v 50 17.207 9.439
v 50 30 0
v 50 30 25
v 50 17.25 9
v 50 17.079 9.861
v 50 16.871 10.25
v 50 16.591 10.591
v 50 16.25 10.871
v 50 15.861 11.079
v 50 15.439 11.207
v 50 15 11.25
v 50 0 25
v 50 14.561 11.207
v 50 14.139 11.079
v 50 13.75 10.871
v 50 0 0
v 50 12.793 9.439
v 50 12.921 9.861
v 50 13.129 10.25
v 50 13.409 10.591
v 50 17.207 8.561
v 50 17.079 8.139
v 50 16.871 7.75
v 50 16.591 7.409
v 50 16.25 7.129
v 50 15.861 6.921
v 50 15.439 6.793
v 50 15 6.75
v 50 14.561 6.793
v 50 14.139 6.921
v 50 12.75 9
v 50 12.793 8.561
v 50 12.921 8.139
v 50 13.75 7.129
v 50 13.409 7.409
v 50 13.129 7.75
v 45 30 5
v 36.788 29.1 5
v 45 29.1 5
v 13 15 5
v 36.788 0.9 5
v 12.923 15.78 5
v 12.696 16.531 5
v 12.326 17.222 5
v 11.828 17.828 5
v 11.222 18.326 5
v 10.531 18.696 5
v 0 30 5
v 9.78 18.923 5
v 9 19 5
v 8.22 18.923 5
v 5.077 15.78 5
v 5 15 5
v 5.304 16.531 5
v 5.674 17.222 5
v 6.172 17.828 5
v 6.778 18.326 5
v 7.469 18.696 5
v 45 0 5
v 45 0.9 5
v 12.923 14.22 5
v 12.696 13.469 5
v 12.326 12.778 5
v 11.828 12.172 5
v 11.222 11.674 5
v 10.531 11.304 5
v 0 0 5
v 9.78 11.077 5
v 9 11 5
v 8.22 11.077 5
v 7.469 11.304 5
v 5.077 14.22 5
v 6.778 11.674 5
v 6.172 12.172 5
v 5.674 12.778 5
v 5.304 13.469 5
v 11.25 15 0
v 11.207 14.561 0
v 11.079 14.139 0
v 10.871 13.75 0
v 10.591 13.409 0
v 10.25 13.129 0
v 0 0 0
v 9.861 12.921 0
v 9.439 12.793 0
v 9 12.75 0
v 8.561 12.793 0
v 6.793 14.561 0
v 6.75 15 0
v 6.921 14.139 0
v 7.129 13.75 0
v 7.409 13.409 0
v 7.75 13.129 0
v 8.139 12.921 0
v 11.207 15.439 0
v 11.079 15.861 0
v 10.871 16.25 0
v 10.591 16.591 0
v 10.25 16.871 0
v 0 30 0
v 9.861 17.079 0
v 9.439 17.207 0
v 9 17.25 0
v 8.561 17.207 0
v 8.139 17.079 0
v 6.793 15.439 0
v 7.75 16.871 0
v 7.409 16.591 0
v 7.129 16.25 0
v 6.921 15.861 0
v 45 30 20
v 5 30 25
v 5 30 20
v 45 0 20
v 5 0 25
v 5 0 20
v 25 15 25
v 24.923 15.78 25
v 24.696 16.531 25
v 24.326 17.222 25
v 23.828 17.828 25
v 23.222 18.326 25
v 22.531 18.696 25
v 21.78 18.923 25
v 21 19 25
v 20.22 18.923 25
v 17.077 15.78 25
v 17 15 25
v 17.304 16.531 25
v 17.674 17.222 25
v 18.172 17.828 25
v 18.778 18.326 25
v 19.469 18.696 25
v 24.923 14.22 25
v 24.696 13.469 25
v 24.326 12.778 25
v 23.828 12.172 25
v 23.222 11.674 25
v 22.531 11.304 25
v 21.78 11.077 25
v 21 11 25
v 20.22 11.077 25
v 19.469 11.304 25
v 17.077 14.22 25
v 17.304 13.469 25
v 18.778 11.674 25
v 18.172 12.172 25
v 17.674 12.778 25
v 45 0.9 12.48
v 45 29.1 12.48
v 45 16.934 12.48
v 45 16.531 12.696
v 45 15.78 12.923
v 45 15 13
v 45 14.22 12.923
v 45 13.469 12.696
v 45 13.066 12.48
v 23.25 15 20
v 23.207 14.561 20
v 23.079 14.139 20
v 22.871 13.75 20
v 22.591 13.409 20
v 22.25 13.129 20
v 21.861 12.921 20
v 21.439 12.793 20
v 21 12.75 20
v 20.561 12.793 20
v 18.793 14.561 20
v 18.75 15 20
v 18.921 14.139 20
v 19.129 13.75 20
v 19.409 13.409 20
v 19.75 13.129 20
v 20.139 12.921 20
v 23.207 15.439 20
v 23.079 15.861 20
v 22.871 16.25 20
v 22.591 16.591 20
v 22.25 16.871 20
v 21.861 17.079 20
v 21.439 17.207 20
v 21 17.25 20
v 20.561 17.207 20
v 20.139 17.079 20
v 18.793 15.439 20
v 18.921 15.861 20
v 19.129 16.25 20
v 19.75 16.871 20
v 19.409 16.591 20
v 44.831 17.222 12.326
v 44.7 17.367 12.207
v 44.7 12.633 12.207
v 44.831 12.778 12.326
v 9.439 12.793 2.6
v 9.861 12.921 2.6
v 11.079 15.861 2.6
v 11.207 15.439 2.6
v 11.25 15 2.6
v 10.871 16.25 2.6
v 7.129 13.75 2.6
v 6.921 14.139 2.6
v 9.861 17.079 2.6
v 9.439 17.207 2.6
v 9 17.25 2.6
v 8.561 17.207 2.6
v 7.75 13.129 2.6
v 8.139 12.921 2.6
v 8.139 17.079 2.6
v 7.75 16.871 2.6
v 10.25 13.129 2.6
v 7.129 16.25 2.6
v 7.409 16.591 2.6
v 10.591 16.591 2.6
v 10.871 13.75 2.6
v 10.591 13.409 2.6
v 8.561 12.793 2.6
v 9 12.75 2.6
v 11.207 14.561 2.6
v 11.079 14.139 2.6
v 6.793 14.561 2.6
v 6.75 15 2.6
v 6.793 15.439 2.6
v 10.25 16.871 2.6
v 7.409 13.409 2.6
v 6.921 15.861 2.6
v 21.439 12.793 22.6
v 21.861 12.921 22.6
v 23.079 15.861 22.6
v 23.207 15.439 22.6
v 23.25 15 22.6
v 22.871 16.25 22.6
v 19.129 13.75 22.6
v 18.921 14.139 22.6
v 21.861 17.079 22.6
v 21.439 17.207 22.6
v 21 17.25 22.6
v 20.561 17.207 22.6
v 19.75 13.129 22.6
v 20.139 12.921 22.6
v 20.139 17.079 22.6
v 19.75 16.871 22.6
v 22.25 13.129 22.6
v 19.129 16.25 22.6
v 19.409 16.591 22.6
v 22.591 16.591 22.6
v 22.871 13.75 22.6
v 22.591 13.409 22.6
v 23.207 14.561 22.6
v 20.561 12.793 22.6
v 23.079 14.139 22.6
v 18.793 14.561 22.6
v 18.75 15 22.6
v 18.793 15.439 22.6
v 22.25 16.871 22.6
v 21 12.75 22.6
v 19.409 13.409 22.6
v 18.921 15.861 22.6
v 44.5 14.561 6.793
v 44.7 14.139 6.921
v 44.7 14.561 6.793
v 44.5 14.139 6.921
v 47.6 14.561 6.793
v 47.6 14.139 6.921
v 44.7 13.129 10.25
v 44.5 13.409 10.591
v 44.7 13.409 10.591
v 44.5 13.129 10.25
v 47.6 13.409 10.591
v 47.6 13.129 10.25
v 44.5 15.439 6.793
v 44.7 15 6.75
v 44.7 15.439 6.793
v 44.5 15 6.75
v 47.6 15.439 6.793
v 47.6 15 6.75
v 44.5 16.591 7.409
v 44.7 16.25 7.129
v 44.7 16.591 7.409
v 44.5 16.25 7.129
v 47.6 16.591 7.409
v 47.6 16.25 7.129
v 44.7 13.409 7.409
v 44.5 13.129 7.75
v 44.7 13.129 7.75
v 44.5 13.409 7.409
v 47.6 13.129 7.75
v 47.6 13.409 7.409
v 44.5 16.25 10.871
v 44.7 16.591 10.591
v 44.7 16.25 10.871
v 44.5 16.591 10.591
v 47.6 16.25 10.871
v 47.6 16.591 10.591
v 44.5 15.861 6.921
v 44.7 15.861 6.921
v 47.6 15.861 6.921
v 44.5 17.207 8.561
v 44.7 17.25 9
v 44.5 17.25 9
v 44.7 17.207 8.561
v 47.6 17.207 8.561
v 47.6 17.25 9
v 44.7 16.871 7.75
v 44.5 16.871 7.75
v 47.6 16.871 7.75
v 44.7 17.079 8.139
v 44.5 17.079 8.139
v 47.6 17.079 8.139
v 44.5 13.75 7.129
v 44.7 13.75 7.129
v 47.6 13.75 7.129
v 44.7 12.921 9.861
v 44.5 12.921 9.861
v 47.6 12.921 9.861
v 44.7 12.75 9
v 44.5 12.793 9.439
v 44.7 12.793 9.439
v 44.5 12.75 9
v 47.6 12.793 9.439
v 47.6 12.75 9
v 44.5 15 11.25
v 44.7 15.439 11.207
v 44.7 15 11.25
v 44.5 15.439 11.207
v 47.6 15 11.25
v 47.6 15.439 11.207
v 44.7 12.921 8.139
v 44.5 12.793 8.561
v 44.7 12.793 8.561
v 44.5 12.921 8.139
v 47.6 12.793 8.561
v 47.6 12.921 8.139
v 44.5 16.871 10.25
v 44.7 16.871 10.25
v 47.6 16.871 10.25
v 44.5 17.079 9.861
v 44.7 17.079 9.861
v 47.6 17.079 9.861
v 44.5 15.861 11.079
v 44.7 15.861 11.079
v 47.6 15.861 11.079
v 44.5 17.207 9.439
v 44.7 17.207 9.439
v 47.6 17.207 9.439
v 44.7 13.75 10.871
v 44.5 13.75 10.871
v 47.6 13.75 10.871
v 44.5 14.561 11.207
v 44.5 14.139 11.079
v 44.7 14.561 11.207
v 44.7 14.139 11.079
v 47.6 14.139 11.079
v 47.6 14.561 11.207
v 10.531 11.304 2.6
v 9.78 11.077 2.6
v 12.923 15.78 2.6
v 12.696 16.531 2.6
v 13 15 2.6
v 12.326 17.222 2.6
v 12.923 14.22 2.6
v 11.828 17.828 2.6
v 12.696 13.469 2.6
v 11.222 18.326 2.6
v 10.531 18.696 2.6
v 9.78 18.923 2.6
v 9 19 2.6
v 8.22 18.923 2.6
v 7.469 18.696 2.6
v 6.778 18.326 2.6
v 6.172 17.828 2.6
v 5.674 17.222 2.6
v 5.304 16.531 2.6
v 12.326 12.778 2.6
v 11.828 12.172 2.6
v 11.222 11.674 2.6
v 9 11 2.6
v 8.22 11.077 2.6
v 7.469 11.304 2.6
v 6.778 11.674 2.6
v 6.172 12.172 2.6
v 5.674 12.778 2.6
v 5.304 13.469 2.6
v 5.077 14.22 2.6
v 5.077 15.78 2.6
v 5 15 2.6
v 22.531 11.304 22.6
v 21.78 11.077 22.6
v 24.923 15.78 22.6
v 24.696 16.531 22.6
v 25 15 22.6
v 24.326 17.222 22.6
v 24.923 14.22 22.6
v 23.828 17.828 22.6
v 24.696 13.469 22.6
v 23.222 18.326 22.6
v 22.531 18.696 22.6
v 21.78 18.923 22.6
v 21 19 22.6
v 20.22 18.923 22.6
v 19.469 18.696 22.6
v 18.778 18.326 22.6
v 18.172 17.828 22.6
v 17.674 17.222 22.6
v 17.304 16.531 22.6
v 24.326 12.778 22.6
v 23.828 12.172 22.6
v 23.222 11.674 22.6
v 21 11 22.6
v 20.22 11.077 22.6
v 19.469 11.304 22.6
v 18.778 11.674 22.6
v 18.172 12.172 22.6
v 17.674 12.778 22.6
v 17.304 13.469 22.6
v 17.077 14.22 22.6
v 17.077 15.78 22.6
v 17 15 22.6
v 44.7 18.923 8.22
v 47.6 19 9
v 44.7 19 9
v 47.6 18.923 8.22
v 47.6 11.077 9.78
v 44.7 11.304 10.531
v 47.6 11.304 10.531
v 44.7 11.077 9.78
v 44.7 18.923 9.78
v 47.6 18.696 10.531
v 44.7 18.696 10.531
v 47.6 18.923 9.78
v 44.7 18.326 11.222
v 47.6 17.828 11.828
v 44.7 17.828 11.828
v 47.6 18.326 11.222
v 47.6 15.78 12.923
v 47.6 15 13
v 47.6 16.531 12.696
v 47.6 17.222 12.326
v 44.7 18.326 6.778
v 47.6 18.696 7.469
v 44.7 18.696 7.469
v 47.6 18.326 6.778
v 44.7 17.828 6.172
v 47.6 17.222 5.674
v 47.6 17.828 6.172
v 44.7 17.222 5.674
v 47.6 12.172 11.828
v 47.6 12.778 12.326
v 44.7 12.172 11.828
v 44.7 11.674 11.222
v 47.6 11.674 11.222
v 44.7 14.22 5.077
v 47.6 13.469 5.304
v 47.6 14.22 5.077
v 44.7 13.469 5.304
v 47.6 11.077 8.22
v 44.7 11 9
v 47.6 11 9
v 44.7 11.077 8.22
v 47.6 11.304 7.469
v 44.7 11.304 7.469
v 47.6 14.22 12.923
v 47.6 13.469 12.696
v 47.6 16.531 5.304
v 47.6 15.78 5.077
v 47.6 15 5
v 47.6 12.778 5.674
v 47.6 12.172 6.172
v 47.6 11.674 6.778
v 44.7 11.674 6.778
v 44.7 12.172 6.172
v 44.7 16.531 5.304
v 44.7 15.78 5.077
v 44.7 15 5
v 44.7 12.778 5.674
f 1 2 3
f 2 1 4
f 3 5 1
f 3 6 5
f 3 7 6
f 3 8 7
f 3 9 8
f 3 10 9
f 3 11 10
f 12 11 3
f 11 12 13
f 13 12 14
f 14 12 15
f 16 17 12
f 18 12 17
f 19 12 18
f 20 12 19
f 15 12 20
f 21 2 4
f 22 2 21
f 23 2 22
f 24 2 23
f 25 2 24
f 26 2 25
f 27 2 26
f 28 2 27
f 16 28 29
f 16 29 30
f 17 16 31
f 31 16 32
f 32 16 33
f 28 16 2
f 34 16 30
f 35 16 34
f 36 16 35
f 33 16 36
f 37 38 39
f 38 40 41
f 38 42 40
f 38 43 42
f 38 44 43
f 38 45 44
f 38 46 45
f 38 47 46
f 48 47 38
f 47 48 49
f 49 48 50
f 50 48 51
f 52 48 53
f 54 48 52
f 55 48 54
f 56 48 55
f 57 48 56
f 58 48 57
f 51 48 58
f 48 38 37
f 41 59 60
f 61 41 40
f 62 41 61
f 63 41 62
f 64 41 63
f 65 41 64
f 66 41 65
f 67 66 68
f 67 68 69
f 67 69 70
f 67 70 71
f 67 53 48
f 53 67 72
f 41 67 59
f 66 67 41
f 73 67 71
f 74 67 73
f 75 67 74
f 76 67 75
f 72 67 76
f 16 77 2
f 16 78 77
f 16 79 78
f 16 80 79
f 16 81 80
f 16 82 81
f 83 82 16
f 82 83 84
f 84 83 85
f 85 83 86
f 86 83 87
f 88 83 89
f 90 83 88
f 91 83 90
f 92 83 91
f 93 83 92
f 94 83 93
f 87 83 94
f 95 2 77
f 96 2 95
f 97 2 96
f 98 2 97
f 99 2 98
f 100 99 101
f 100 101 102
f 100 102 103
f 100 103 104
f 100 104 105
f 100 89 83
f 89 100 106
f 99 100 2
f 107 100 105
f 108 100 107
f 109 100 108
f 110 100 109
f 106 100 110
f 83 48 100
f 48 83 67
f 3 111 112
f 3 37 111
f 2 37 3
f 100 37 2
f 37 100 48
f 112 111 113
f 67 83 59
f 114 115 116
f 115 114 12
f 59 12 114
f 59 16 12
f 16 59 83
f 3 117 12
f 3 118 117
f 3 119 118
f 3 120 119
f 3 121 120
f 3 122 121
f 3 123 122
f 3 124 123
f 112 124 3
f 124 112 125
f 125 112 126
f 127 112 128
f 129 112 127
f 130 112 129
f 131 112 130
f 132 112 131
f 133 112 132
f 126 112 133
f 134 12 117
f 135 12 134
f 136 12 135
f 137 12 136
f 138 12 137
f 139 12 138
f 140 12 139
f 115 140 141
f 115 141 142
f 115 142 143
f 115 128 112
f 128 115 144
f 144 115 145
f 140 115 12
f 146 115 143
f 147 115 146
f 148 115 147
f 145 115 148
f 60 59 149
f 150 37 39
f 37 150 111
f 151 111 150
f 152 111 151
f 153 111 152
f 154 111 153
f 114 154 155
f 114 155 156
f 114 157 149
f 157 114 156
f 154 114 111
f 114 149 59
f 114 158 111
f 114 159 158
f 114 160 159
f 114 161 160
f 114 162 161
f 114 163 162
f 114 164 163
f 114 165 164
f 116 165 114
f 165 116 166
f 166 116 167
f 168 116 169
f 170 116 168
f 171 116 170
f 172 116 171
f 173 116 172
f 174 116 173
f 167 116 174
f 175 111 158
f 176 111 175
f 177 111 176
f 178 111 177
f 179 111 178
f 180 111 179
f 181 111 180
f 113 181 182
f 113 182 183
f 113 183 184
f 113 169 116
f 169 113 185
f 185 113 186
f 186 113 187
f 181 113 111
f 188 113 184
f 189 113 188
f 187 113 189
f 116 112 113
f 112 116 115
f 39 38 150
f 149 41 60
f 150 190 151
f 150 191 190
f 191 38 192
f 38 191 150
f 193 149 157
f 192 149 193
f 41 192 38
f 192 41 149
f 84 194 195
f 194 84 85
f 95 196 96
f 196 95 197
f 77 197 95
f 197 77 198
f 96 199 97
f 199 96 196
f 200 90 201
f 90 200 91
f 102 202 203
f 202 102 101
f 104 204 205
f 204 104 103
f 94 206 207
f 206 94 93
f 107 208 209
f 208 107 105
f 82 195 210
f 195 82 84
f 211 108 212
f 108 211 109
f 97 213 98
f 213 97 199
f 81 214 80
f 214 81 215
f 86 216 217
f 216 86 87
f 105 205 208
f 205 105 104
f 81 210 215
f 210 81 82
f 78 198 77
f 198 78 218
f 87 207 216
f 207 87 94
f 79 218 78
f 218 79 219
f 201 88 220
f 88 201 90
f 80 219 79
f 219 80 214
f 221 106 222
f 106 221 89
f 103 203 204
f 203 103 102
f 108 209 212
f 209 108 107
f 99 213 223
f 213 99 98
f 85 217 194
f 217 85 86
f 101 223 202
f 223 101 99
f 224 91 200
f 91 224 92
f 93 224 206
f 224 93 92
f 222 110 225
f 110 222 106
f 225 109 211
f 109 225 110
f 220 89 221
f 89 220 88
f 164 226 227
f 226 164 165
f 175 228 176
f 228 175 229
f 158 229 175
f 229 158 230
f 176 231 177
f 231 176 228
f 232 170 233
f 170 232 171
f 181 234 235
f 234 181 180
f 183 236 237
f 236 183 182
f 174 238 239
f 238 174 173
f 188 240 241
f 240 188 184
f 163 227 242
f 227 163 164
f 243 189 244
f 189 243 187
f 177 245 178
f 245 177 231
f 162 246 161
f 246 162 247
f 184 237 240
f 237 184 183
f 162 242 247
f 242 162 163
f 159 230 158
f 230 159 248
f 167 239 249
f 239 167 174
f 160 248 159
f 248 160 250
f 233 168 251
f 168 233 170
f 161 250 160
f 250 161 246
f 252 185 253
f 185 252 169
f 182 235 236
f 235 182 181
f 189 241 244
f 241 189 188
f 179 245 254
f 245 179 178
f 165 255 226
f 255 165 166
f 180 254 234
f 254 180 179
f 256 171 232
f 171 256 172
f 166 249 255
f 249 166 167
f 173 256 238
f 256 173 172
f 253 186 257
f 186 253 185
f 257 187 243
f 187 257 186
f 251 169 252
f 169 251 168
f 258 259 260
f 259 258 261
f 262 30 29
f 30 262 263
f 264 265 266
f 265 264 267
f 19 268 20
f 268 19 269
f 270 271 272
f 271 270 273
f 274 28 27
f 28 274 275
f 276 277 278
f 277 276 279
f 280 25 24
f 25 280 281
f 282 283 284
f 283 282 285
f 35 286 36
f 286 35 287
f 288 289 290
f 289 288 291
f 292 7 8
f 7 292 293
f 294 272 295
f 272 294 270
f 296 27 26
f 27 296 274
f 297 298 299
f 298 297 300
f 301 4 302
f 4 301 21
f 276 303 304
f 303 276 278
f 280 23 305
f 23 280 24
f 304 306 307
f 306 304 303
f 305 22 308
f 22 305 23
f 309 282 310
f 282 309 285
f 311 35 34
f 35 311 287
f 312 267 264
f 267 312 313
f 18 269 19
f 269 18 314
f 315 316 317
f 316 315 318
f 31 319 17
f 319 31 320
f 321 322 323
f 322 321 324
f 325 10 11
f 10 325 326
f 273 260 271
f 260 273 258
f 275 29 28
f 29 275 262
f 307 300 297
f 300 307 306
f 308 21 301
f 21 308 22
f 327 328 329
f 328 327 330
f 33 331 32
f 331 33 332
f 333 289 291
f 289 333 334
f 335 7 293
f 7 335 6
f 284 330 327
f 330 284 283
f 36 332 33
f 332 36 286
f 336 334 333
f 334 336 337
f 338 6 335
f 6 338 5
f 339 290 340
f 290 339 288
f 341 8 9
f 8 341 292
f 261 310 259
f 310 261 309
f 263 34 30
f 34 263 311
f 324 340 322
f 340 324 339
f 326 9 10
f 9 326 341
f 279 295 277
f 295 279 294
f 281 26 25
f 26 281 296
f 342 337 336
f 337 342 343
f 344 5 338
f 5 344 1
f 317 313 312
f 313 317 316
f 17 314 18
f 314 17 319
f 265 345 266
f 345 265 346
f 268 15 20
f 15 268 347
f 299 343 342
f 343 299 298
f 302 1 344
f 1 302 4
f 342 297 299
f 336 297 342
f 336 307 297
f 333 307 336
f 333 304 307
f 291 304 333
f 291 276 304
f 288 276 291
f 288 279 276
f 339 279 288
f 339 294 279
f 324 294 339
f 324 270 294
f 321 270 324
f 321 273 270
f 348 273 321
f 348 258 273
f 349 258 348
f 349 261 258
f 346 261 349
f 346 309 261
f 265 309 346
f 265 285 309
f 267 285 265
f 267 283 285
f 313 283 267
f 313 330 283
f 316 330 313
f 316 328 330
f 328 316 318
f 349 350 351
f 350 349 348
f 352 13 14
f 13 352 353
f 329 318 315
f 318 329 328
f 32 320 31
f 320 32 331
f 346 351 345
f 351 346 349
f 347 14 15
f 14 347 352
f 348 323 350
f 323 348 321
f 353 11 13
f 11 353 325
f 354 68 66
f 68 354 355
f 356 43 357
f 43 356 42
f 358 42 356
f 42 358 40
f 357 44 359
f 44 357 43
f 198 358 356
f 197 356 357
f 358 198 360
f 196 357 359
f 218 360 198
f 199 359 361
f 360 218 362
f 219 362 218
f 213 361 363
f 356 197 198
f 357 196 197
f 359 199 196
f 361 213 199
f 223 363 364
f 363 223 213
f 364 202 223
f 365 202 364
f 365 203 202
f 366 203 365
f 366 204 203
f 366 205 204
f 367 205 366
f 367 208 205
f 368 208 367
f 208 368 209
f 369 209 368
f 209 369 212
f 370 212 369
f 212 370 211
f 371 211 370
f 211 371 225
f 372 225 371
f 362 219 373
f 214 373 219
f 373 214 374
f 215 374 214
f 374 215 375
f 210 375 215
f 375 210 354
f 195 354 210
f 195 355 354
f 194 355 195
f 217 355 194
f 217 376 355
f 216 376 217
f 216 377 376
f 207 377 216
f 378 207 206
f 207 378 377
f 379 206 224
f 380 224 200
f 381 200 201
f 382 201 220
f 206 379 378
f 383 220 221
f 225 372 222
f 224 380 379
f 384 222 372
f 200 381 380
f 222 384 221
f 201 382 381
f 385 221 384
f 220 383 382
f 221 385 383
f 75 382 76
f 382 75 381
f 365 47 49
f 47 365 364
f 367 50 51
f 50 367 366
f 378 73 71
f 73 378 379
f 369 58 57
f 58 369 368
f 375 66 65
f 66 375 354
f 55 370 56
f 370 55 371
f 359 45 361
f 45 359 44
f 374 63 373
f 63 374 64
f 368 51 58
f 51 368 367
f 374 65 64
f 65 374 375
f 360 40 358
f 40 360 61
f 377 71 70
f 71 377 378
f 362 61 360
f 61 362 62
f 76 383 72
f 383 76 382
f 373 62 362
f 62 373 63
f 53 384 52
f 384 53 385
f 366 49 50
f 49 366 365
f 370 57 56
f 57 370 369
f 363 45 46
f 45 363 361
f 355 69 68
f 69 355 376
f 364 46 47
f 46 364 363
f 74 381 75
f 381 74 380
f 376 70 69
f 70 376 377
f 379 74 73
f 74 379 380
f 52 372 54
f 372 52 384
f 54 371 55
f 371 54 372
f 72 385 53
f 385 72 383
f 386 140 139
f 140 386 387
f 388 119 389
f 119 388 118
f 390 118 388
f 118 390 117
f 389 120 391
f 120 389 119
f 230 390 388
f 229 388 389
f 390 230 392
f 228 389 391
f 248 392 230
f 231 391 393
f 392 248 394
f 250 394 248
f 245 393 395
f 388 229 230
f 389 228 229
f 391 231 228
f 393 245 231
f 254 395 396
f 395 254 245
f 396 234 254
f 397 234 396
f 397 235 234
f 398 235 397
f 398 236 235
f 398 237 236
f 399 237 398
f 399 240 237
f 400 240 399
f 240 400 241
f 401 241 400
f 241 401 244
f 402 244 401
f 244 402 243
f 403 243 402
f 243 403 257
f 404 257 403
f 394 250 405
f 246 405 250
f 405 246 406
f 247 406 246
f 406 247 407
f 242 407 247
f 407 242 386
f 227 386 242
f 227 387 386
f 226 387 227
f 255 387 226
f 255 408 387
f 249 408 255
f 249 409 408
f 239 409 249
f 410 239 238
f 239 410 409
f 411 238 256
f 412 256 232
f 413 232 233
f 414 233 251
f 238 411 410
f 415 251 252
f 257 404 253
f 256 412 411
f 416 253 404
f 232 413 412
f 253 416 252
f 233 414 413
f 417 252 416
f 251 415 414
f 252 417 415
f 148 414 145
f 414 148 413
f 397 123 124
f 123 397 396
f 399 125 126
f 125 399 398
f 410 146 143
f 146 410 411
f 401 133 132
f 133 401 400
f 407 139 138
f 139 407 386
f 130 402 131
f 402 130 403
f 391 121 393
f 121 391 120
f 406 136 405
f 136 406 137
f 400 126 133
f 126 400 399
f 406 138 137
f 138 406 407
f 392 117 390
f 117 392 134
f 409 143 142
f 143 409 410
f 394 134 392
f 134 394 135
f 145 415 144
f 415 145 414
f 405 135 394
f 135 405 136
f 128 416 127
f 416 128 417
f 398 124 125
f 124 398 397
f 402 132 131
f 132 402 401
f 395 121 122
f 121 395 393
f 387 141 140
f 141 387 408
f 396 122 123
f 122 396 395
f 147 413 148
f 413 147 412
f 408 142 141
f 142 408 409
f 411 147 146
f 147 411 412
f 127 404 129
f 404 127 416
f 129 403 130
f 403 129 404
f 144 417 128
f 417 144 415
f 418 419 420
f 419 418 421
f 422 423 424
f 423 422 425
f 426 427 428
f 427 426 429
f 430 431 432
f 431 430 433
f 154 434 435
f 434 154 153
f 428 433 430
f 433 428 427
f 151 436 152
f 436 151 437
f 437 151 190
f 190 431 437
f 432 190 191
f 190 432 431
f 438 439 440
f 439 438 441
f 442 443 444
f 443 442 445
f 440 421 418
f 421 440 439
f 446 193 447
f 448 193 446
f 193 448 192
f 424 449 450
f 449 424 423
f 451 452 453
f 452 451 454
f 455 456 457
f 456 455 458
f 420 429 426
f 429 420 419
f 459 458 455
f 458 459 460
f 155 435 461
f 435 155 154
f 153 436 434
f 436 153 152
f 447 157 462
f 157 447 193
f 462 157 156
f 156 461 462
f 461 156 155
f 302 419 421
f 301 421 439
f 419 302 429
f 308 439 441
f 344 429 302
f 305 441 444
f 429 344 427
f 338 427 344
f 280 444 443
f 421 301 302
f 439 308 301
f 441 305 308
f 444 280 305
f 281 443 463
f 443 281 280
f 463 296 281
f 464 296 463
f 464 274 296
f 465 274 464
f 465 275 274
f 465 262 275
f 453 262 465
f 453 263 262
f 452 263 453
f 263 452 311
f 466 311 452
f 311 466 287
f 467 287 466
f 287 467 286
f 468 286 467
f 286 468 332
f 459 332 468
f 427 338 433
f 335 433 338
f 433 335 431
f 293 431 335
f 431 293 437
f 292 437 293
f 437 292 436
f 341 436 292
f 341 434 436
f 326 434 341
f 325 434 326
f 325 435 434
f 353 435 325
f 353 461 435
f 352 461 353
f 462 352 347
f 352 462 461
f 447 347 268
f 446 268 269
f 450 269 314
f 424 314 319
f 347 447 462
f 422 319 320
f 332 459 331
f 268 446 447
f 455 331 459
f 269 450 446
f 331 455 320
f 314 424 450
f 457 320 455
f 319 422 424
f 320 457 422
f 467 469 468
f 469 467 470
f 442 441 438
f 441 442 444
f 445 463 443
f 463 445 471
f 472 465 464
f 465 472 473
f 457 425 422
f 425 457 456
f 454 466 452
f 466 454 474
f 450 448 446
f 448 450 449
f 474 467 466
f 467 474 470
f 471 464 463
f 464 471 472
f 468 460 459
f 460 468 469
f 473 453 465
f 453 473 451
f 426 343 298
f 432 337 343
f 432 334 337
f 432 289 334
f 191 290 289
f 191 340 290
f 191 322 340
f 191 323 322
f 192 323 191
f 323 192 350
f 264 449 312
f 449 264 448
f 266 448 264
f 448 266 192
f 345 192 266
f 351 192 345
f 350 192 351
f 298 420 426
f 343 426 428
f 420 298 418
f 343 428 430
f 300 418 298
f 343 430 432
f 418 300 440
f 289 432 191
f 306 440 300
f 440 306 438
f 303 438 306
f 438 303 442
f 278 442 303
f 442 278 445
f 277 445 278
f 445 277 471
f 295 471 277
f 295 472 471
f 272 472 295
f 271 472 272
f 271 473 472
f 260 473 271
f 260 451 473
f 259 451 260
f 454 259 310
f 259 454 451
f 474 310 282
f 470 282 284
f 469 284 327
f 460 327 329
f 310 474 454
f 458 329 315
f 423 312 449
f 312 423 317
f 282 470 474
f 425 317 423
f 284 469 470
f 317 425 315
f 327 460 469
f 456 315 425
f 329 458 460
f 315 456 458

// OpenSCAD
$fn = 32;

// ----------------------------------------------------------------------
// Z-bracket: 50 x 30 x 25 mm
// ----------------------------------------------------------------------

// --- parameters (mm) ---
foot_len = 50;            // lower foot length, X
top_len = 40;             // upper foot length, X
depth = 30;               // bracket width, Y
step_h = 25;              // overall rise, Z
plate_t = 5;              // plate thickness
hole_d = 4.5;             // clearance for M4
cb_d = 8;                 // counterbore diameter
cb_h = 2.4;               // counterbore depth
rib_len = 9.2;            // gusset leg
rib_sink = 0.9;           // gusset overlap into the plates

module hole_z(px, py, z0) {
  translate([px, py, z0 - 0.5]) cylinder(h = plate_t + 1, d = hole_d);
}
module hole_x(py, pz) {
  translate([-0.5, py, pz]) rotate([0, 90, 0]) cylinder(h = plate_t + 1, d = hole_d);
}
module cb_z(px, py, top_z) {
  translate([px, py, top_z - cb_h]) cylinder(h = cb_h + 0.5, d = cb_d);
}
module cb_x(py, pz) {
  translate([plate_t - cb_h, py, pz]) rotate([0, -90, 0]) cylinder(h = cb_h + 0.5, d = cb_d);
}
module gusset(x0) {
  translate([x0, depth - rib_sink, 0])
    rotate([90, 0, 0])
      linear_extrude(height = depth - 2 * rib_sink)
        polygon(points = [[rib_sink, plate_t - rib_sink],
                          [rib_sink, plate_t - rib_sink + rib_len],
                          [-rib_len, plate_t - rib_sink]]);
}

difference() {
  union() {
    cube([foot_len, depth, plate_t]);
    /* web, overlapping the lower foot */
    translate([foot_len - plate_t, 0, 0]) cube([plate_t, depth, step_h]);
    /* upper foot, sunk into the web */
    translate([foot_len - plate_t - top_len, 0, step_h - plate_t]) cube([top_len + plate_t, depth, plate_t]);
    gusset(foot_len - plate_t);
  }
  hole_z(9, 15, 0);
  translate([foot_len - plate_t - 24, 0, 0]) hole_z(0, 15, step_h - plate_t);
  translate([foot_len - plate_t, 0, 0]) hole_x(15, 9);
  cb_z(9, 15, plate_t);
  translate([foot_len - plate_t - 24, 0, 0]) cb_z(0, 15, step_h);
  translate([foot_len - plate_t, 0, 0]) cb_x(15, 9);
}
